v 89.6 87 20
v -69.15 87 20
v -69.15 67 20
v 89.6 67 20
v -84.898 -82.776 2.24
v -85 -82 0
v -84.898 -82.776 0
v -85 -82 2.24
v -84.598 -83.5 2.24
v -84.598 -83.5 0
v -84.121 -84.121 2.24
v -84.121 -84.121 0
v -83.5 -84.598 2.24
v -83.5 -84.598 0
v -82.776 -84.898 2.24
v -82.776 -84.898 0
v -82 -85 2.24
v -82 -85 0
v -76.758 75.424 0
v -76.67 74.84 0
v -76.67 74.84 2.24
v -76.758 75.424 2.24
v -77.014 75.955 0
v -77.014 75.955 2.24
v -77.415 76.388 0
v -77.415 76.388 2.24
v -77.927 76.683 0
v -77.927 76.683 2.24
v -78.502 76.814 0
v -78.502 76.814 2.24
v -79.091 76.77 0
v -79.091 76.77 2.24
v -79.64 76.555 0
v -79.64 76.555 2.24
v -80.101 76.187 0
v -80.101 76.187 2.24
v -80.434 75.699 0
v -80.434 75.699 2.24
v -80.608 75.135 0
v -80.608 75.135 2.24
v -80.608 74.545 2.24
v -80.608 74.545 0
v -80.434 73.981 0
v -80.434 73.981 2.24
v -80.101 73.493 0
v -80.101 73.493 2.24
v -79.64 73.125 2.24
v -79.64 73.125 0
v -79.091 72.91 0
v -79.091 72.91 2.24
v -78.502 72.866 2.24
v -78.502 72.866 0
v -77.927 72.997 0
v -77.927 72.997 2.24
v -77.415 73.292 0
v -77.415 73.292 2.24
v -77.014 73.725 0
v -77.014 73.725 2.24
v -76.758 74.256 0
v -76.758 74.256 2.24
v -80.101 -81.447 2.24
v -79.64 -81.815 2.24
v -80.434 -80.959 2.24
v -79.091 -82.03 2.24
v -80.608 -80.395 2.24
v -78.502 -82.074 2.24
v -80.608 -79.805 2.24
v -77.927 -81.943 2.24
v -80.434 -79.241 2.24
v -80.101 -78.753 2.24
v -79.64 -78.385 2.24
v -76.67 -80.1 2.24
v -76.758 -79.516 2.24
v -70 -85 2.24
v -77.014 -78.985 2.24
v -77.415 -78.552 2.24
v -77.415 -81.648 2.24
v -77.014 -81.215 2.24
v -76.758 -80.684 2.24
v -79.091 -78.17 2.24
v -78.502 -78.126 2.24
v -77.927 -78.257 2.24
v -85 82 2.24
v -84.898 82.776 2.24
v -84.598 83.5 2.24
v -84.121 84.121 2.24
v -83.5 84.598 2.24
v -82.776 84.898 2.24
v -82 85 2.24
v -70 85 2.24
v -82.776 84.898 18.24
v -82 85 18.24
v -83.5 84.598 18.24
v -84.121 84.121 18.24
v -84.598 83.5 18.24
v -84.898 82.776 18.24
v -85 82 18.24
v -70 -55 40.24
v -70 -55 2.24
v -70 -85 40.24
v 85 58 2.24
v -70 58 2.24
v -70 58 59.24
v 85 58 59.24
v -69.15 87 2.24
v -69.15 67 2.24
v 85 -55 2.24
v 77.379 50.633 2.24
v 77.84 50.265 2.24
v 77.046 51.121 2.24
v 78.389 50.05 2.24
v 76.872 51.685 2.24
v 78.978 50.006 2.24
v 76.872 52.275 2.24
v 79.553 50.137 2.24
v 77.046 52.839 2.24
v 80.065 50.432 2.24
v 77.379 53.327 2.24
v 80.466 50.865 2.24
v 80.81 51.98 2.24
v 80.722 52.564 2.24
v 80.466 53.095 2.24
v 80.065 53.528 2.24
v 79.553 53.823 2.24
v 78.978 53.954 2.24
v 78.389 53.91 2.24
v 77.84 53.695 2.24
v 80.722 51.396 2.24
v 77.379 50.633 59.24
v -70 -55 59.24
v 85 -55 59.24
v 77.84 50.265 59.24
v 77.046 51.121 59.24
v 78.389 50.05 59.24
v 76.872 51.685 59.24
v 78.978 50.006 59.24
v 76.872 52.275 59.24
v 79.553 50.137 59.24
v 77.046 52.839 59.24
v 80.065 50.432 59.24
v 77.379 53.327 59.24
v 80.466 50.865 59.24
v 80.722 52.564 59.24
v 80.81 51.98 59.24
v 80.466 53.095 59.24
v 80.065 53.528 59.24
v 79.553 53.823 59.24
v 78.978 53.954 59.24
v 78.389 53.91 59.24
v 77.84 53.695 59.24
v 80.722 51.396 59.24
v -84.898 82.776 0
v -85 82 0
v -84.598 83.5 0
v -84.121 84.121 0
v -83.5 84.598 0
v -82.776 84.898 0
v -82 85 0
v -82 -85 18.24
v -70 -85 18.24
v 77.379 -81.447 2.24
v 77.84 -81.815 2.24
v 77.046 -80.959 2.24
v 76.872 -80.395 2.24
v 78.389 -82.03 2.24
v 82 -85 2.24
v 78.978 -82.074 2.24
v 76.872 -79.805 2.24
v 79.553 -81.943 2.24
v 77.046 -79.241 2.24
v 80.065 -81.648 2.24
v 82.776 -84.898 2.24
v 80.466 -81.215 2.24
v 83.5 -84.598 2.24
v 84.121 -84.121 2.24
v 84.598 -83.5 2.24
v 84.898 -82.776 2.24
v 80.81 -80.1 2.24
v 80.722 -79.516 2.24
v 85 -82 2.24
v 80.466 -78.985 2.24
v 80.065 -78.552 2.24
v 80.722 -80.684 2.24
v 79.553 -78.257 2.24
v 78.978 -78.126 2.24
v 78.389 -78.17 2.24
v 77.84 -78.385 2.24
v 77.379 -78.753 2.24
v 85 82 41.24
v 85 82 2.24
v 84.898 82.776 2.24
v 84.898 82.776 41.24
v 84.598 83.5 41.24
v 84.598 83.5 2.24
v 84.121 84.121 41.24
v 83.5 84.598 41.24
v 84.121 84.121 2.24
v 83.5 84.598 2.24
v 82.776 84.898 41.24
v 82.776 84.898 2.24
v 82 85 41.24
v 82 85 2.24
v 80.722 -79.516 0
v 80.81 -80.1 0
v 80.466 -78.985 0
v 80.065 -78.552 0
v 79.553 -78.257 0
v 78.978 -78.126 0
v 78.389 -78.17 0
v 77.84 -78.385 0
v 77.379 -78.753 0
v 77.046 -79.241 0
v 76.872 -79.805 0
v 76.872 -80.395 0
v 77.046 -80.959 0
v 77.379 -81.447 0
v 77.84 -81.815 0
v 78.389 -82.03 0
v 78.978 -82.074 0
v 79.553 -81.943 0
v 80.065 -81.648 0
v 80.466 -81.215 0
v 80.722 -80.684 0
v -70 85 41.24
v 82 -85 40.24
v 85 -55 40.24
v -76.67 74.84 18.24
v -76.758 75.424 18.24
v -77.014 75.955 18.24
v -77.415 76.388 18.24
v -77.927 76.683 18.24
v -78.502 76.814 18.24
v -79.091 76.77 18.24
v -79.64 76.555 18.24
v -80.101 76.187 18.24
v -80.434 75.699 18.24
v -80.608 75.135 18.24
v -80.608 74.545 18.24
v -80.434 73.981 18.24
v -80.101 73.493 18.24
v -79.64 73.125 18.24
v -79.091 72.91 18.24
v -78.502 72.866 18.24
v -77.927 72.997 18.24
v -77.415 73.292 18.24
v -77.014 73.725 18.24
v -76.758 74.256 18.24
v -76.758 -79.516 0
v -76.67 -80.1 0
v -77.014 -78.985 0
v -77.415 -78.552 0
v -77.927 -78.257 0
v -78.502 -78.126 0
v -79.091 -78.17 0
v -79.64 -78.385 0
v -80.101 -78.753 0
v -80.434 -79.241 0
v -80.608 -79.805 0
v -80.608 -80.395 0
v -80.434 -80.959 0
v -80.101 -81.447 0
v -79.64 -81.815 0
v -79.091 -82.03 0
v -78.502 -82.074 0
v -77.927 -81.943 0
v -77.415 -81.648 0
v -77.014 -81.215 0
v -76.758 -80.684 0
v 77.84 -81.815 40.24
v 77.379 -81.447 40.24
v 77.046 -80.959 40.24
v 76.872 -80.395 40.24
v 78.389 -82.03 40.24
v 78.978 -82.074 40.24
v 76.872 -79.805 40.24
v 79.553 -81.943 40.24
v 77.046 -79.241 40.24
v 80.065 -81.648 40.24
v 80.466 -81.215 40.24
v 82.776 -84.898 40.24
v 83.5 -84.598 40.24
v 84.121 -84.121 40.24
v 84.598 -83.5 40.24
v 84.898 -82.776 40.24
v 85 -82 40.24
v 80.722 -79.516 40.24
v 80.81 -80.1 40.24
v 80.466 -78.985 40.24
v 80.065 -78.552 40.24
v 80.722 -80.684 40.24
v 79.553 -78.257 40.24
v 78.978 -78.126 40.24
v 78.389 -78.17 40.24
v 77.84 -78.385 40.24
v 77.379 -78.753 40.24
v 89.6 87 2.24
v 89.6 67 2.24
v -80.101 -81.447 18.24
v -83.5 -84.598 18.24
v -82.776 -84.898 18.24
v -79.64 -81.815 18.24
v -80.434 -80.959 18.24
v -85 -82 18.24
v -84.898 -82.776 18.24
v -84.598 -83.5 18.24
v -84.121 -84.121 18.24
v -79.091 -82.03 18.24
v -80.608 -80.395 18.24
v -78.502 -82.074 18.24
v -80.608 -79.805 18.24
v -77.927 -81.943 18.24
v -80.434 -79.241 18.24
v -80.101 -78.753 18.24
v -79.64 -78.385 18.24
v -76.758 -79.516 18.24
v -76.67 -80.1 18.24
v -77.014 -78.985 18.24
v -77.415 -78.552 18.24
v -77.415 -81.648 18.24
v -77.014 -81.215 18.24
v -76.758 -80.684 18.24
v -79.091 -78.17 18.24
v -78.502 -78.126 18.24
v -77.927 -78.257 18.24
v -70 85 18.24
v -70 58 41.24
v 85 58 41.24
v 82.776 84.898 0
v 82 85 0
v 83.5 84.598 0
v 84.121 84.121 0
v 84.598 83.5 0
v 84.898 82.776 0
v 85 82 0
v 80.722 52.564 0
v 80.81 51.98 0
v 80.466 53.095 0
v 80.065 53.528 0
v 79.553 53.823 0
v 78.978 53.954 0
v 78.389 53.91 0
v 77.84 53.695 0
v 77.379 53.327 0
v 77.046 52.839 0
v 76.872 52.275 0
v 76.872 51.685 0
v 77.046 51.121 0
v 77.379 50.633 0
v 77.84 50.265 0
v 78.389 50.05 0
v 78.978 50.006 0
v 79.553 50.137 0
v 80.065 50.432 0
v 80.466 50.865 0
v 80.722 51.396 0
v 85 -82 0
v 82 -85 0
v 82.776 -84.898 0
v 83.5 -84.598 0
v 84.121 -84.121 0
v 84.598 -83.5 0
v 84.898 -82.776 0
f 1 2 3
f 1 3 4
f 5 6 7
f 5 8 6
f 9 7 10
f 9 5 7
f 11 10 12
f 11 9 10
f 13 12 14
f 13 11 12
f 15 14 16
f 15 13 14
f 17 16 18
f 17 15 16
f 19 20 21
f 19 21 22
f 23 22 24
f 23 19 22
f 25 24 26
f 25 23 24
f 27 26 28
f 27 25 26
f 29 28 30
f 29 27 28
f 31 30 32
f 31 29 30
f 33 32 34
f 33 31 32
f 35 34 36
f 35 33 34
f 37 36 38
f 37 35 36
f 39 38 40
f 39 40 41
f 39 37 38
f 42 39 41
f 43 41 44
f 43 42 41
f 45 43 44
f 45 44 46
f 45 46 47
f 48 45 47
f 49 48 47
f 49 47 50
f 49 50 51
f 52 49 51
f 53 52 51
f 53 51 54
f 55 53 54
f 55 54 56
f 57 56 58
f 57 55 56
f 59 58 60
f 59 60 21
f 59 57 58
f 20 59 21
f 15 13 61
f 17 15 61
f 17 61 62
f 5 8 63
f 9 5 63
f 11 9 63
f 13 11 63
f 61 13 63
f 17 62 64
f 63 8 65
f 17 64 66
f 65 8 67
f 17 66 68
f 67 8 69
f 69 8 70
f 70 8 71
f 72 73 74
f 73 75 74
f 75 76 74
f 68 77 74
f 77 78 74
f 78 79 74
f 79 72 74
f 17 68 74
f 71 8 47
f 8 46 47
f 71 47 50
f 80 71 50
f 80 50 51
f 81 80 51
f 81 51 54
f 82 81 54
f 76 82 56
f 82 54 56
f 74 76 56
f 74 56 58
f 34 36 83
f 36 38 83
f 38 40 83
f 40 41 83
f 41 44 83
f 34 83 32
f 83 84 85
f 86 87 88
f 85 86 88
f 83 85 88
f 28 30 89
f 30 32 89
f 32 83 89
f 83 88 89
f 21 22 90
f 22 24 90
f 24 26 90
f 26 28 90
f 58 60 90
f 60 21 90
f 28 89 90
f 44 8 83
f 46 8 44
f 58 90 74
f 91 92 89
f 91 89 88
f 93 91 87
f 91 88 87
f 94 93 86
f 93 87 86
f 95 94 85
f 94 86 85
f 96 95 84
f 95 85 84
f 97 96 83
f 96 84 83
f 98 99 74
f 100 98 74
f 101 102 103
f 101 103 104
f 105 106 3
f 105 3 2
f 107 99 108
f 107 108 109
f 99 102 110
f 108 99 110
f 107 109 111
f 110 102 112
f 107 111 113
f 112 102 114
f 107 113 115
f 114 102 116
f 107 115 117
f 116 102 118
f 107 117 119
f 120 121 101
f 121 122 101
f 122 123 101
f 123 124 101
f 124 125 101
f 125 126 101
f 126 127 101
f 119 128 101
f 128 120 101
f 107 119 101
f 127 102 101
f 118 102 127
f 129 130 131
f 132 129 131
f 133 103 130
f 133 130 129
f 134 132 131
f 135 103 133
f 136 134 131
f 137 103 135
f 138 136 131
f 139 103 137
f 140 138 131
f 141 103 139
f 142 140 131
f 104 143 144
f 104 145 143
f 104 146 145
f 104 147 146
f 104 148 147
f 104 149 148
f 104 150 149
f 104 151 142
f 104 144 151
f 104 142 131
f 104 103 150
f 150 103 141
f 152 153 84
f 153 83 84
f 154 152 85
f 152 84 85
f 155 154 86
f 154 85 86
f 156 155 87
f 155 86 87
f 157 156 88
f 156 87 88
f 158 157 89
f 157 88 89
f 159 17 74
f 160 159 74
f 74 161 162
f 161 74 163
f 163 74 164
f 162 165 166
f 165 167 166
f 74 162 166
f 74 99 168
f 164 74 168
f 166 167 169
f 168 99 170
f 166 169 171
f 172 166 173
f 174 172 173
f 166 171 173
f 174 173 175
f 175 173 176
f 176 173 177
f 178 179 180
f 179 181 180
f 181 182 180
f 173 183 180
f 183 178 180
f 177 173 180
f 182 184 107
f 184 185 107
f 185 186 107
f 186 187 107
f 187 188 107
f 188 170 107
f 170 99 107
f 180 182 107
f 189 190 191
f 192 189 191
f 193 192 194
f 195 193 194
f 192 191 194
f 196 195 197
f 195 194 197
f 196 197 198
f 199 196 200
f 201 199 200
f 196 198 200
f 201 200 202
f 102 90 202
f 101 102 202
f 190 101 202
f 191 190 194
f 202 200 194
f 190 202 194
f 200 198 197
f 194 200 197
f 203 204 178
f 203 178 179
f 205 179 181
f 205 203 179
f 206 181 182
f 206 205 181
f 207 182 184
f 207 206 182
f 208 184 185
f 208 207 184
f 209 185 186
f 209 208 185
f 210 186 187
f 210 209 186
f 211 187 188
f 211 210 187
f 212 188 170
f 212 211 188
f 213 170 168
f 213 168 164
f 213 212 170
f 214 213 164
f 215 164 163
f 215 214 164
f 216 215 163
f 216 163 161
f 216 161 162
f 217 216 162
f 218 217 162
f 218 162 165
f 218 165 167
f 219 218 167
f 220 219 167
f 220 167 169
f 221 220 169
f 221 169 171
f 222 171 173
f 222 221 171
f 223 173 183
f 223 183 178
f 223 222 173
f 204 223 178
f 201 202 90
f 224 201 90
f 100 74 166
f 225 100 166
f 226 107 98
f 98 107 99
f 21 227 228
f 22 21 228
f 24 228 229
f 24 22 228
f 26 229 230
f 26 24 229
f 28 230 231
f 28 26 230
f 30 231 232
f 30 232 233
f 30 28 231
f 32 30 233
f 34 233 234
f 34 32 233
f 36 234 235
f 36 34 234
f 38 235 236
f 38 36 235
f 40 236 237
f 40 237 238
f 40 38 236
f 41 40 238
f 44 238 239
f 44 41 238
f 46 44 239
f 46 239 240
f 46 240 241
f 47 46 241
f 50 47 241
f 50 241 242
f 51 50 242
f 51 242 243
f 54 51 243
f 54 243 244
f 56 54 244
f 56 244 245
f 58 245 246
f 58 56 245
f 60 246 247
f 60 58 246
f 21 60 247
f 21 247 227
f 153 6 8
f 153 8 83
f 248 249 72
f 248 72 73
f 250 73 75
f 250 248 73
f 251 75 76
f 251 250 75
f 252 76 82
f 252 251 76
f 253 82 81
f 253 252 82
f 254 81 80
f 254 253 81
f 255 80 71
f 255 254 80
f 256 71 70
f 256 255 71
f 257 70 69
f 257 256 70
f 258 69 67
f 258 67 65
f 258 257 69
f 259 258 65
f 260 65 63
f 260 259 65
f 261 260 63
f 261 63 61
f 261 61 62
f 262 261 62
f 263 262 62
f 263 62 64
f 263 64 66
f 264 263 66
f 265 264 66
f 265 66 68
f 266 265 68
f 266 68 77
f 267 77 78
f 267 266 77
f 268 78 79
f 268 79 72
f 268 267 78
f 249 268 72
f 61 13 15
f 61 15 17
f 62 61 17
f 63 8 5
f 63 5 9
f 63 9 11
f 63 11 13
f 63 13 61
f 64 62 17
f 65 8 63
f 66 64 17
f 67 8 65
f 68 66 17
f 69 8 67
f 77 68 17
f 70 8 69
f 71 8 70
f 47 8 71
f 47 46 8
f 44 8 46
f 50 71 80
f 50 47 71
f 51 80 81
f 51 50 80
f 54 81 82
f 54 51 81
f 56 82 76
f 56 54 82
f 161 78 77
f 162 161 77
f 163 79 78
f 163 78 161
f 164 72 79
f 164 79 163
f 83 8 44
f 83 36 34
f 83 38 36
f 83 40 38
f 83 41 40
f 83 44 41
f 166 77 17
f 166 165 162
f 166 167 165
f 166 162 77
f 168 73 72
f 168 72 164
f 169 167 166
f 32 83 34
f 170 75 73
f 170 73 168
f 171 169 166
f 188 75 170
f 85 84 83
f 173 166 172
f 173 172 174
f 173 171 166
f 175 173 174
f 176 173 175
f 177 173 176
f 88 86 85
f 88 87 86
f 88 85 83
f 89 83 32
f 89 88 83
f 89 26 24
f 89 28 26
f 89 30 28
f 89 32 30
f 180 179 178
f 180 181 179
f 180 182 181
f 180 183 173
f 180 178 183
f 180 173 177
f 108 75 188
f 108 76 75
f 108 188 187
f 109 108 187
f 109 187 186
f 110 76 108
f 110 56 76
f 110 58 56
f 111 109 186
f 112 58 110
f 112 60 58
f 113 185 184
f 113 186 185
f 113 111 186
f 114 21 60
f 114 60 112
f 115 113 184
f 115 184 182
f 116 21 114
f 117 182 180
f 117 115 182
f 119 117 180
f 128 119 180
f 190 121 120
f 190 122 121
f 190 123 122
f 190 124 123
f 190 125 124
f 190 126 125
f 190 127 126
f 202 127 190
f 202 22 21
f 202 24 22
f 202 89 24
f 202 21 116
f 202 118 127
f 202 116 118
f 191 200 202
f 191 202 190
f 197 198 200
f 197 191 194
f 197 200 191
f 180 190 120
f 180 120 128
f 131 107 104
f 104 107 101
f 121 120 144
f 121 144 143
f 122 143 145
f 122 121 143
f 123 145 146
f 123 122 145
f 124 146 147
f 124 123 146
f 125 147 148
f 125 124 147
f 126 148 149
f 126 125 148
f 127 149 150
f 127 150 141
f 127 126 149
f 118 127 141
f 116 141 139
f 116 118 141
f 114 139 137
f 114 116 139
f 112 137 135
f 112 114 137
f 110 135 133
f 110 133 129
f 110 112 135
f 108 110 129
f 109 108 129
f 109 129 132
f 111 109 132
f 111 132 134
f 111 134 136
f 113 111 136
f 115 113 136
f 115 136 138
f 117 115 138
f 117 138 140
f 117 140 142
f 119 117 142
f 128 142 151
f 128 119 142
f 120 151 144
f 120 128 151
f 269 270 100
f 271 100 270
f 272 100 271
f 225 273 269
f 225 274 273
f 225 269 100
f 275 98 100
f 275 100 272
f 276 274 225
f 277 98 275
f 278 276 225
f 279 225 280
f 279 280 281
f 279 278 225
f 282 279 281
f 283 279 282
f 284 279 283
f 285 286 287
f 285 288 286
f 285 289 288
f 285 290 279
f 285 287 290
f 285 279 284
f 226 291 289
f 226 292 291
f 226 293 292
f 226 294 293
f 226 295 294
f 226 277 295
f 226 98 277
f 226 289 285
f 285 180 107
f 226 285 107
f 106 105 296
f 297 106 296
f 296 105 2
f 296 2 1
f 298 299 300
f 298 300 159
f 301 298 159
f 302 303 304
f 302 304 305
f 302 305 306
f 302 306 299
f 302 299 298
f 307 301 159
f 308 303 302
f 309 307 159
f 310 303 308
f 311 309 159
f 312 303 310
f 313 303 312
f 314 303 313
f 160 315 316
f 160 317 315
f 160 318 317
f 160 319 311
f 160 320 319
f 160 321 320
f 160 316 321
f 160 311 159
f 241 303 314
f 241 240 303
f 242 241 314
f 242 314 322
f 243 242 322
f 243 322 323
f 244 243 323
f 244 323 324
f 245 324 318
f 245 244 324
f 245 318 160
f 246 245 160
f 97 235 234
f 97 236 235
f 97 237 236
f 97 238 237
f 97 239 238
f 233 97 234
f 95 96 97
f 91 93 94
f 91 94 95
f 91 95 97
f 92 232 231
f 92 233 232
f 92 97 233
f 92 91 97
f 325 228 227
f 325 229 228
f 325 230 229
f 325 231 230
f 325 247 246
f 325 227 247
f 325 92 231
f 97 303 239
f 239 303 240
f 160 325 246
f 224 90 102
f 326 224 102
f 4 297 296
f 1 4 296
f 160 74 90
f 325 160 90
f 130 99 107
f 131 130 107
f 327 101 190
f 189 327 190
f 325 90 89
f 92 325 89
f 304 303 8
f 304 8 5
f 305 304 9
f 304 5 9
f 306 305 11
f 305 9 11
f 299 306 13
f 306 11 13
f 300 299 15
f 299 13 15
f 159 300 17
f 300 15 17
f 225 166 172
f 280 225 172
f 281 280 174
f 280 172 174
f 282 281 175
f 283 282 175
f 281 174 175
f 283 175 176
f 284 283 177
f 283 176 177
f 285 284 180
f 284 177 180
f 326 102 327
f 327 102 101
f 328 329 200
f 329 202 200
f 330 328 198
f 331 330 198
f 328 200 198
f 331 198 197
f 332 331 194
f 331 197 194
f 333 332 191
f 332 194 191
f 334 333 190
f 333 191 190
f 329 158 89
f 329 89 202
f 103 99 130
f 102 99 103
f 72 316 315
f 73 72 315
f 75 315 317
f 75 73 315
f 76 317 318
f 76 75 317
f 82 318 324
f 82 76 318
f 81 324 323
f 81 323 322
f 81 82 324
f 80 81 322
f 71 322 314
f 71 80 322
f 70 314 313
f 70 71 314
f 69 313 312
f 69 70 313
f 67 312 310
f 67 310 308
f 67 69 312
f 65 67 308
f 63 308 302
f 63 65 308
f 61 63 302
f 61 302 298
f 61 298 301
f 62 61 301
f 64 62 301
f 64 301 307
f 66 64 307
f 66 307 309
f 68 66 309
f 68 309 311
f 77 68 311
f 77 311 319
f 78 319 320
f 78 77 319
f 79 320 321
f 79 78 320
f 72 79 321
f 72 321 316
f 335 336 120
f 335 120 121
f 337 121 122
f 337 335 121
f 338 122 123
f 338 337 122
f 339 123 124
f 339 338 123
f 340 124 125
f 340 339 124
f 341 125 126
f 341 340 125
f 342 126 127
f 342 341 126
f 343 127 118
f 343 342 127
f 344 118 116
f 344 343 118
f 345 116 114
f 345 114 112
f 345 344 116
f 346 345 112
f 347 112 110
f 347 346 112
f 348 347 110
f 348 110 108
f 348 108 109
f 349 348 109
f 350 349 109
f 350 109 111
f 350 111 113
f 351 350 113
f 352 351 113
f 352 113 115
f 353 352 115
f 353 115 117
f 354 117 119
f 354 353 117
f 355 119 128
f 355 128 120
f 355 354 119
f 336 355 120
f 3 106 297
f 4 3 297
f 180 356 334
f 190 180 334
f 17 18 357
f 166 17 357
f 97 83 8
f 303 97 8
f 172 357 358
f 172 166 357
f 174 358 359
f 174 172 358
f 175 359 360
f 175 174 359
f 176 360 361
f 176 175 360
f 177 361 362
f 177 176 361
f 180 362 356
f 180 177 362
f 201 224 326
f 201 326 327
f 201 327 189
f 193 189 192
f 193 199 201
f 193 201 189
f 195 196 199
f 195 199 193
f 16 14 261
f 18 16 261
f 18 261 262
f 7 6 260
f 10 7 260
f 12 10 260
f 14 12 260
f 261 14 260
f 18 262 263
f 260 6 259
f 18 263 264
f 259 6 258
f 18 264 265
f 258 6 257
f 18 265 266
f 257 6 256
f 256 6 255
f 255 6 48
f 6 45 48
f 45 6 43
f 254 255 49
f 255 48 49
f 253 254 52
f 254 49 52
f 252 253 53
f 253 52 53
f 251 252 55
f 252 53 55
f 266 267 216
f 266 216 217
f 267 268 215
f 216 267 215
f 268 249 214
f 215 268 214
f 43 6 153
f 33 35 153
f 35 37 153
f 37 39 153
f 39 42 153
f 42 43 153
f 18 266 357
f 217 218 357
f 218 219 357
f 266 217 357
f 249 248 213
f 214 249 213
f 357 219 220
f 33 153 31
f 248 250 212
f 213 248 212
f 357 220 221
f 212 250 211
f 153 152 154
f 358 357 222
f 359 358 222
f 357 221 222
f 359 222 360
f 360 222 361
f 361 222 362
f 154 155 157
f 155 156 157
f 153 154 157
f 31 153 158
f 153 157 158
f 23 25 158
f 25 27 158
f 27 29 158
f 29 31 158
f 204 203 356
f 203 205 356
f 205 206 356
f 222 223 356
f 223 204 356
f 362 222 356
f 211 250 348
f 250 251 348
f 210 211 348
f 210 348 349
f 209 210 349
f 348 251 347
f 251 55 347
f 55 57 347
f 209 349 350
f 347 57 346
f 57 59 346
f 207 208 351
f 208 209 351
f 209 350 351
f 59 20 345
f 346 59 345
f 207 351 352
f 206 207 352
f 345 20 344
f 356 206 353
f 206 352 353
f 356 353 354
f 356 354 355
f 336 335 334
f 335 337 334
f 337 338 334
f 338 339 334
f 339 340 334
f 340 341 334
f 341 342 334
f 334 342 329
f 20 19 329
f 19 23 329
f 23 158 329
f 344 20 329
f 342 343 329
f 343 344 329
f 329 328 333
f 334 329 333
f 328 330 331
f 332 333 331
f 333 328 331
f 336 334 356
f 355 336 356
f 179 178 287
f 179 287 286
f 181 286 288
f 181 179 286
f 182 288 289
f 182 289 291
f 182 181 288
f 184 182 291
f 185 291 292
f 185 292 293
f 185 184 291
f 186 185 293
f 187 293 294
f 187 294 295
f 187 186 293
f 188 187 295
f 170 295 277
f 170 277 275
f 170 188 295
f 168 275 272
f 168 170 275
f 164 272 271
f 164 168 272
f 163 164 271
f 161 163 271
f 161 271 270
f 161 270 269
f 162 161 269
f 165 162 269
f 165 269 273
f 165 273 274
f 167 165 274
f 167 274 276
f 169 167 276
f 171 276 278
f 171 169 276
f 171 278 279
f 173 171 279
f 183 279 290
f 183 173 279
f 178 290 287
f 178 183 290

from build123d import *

# Parameters (mm, degrees)
F0_W     = 170
F0_H     = 170
F0_R     = 1.98
F1_DEPTH = 2.24
F2_R     = 3
F3_W     = 158.75
F3_H     = 20
F4_DEPTH = 17.76
F5_R     = 1.98
F6_DEPTH = 16
F7_DEPTH = 39
F8_DEPTH = 38
F5_W     = 155
F5_H     = 113
F9_DEPTH = 57


with BuildPart() as f1:
    # F0 (on Top) → F1 (new body)
    with BuildSketch(Plane.XY):
        Rectangle(F0_W, F0_H)
        with Locations((-78.65, -80.1)):
            Circle(F0_R, mode=Mode.SUBTRACT)
        with Locations((78.83, -80.1)):
            Circle(F0_R, mode=Mode.SUBTRACT)
        with Locations((-78.65, 74.84)):
            Circle(F0_R, mode=Mode.SUBTRACT)
        with Locations((78.83, 51.98)):
            Circle(F0_R, mode=Mode.SUBTRACT)
    extrude(amount=F1_DEPTH)

    # F2
    f2_edges = [f1.edges().sort_by_distance(p)[0] for p in [
        (-85, 85, 1.12),
        (-85, -85, 1.12),
        (85, -85, 1.12),
        (85, 85, 1.12),
    ]]
    fillet(f2_edges, radius=F2_R)


with BuildPart() as f4:
    # F3 (on face) → F4 (new body)
    with BuildSketch(Plane.XY.offset(2.24)):
        with Locations((10.225, 77)):
            Rectangle(F3_W, F3_H)
    extrude(amount=F4_DEPTH)


with BuildPart() as f6:
    # F5 (on face) → F6 (new body)
    with BuildSketch(Plane.XY.offset(2.24)):
        with BuildLine():
            Line((-70, -55), (-70, 58))
            Line((-70, 58), (-70, 85))
            Line((-70, 85), (-82, 85))
            ThreePointArc((-82, 85), (-84.12132, 84.12132), (-85, 82))
            Line((-85, 82), (-85, -82))
            ThreePointArc((-85, -82), (-84.12132, -84.12132), (-82, -85))
            Line((-82, -85), (-70, -85))
            Line((-70, -85), (-70, -55))
        make_face()
        with Locations((-78.65, -80.1)):
            Circle(F5_R, mode=Mode.SUBTRACT)
        with Locations((-78.65, 74.84)):
            Circle(F5_R, mode=Mode.SUBTRACT)
    extrude(amount=F6_DEPTH)


with BuildPart() as f7:
    # F5 (on face) → F7 (new body)
    with BuildSketch(Plane.XY.offset(2.24)):
        with BuildLine():
            Line((-70, 85), (-70, 58))
            Line((-70, 58), (85, 58))
            Line((85, 58), (85, 82))
            ThreePointArc((85, 82), (84.12132, 84.12132), (82, 85))
            Line((82, 85), (-70, 85))
        make_face()
    extrude(amount=F7_DEPTH)


with BuildPart() as f8:
    # F5 (on face) → F8 (new body)
    with BuildSketch(Plane.XY.offset(2.24)):
        with BuildLine():
            Line((85, -55), (-70, -55))
            Line((-70, -55), (-70, -85))
            Line((-70, -85), (82, -85))
            ThreePointArc((82, -85), (84.12132, -84.12132), (85, -82))
            Line((85, -82), (85, -55))
        make_face()
        with Locations((78.83, -80.1)):
            Circle(F5_R, mode=Mode.SUBTRACT)
    extrude(amount=F8_DEPTH)


with BuildPart() as f9:
    # F5 (on face) → F9 (new body)
    with BuildSketch(Plane.XY.offset(2.24)):
        with Locations((7.5, 1.5)):
            Rectangle(F5_W, F5_H)
        with Locations((78.83, 51.98)):
            Circle(F5_R, mode=Mode.SUBTRACT)
    extrude(amount=F9_DEPTH)


solid = Compound([f1.part, f4.part, f6.part, f7.part, f8.part, f9.part])
